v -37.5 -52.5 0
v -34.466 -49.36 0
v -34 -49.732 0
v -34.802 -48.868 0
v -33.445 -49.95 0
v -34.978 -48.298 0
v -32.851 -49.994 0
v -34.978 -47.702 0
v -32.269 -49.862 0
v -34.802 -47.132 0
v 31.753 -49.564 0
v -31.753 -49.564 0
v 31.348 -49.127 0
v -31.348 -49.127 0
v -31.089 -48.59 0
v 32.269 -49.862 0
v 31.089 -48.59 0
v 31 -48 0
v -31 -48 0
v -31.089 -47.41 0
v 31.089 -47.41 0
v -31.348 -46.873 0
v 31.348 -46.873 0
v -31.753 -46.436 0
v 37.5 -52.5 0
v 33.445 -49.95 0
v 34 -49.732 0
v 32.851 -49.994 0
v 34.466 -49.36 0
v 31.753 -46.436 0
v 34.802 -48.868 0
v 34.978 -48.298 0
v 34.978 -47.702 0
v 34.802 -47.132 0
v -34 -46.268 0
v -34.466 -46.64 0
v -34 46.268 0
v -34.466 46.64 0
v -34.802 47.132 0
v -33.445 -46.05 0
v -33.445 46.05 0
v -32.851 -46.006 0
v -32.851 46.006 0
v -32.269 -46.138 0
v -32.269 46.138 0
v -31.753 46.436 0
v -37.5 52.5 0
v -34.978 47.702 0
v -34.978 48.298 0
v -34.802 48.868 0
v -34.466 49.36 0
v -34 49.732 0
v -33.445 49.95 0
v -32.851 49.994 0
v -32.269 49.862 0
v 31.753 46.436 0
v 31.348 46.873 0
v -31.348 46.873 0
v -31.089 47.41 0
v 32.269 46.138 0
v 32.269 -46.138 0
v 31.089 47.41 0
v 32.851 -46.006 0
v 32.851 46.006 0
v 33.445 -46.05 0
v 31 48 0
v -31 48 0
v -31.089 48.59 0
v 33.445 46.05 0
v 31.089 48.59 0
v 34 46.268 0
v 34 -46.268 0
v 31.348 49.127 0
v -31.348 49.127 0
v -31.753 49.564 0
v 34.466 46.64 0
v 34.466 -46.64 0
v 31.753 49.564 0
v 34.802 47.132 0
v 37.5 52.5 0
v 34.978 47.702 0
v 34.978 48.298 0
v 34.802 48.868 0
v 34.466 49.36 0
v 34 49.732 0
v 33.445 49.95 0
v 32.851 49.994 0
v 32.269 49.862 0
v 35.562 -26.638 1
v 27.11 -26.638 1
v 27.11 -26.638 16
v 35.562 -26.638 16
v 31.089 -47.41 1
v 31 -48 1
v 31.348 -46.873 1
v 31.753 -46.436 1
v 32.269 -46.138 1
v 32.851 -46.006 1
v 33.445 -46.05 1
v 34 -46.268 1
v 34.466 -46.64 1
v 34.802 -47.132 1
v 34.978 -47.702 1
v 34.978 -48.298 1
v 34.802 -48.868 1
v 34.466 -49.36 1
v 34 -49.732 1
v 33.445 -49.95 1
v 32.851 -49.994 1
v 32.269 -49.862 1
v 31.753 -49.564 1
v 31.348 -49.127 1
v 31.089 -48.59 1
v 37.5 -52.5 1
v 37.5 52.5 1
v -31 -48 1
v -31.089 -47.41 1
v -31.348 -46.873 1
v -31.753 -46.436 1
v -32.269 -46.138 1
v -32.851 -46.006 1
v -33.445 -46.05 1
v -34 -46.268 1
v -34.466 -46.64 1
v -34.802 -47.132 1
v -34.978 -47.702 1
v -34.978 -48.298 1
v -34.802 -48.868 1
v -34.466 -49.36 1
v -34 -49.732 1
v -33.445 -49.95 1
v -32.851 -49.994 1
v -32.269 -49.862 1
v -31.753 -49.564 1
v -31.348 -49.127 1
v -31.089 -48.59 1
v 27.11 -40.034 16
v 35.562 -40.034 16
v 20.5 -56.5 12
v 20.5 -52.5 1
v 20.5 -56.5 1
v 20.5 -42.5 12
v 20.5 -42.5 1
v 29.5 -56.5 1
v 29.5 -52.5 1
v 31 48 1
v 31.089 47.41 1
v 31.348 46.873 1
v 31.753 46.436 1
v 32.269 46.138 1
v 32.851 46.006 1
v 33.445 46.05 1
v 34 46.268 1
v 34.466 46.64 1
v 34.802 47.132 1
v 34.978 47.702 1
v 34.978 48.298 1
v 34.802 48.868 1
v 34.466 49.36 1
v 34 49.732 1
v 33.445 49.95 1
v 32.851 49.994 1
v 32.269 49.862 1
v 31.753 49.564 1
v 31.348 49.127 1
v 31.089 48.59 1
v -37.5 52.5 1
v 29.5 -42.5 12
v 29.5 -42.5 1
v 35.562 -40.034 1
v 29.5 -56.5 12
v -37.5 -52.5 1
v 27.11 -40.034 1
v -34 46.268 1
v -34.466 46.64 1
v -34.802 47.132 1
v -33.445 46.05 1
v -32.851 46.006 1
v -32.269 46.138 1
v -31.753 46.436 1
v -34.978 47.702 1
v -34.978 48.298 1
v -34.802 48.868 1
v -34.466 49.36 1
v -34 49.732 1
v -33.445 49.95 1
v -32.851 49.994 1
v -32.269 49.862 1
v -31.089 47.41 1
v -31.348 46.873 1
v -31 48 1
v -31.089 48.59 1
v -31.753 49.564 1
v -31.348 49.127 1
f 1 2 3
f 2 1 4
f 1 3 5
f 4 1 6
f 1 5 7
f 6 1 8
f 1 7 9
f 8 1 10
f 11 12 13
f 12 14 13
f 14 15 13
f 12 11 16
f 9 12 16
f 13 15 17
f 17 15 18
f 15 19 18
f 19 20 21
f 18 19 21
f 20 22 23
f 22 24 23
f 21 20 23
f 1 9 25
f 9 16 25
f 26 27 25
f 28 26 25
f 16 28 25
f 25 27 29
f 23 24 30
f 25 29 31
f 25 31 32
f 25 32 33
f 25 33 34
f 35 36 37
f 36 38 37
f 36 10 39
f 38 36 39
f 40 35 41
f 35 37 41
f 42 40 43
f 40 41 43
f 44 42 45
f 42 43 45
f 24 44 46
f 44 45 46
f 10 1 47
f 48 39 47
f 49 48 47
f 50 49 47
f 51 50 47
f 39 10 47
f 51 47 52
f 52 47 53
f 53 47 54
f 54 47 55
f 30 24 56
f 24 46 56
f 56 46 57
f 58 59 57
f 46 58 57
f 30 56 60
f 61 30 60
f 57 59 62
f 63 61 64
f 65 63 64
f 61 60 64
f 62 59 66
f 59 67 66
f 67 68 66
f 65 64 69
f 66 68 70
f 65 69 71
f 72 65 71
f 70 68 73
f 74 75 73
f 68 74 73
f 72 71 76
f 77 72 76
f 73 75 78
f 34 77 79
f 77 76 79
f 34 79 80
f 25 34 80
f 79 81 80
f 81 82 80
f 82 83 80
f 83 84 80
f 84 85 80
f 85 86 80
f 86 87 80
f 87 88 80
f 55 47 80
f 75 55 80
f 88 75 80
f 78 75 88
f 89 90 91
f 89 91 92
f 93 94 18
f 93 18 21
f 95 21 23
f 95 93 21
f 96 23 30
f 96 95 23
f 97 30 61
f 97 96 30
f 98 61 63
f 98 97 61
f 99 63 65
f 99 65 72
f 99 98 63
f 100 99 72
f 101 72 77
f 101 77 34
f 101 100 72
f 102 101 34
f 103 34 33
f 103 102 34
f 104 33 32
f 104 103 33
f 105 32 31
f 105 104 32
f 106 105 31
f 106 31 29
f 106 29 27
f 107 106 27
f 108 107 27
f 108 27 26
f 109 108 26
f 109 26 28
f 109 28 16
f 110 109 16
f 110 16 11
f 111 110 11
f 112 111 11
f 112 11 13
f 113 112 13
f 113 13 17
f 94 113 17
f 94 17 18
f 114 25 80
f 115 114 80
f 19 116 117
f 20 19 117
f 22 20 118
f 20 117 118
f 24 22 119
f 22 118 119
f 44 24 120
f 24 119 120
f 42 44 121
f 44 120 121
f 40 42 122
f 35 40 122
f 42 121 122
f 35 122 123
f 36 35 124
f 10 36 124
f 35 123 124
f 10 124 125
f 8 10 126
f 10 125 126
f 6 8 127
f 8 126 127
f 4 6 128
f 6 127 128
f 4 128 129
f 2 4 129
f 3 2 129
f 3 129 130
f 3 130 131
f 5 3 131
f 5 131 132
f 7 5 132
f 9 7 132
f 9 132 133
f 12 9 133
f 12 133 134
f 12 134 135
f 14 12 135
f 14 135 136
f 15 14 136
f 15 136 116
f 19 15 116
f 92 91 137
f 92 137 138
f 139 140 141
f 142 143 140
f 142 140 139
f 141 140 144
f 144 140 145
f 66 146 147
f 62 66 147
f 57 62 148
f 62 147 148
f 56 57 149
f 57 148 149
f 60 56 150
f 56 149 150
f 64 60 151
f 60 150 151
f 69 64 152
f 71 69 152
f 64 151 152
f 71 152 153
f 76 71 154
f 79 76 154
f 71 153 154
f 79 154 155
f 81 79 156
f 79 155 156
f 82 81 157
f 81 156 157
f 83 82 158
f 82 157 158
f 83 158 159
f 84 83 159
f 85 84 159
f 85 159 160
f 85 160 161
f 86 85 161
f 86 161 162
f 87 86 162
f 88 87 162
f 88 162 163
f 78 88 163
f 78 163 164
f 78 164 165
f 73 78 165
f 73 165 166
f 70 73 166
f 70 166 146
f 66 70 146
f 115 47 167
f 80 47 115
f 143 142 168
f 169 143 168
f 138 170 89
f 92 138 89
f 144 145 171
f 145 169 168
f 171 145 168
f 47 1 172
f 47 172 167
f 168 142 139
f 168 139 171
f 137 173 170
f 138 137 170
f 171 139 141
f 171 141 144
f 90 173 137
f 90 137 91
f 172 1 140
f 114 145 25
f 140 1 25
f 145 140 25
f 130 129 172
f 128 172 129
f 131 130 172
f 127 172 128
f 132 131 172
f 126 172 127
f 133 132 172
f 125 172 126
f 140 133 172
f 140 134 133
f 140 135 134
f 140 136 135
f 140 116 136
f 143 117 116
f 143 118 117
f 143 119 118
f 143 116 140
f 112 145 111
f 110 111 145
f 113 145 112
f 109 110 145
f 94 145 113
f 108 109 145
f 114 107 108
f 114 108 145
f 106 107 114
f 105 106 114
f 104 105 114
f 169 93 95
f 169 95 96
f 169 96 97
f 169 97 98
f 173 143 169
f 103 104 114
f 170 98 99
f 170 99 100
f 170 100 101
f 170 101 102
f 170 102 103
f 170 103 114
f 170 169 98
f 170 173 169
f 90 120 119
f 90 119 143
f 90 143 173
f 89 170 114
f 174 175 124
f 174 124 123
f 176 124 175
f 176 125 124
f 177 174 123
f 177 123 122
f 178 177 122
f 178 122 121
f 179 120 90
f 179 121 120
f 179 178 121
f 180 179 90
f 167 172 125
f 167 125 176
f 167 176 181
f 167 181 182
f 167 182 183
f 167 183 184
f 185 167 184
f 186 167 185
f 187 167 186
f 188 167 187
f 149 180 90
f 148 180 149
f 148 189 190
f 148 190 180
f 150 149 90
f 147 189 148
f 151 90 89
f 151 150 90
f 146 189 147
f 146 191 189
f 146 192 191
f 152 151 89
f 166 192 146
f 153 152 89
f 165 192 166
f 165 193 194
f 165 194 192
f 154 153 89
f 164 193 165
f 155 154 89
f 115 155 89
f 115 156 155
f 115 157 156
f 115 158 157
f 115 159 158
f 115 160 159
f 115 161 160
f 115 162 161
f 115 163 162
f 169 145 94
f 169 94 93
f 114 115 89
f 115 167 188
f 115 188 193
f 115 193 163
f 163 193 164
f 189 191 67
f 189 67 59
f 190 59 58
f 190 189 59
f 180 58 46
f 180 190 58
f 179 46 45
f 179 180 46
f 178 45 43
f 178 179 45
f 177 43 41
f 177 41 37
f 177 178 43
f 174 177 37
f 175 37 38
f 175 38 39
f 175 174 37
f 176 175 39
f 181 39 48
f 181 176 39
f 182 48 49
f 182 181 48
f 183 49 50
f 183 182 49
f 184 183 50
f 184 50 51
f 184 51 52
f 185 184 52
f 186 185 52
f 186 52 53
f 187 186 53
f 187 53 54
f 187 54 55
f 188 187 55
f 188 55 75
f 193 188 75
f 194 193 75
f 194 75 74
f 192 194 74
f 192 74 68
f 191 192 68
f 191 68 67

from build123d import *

# Parameters (mm, degrees)
ESQUISSE1_W               = 75
ESQUISSE1_H               = 105
BOSS_EXTRU_1_DEPTH        = 1
ENL_V_MAT_EXTRU_1_REACH   = 66.525
ESQUISSE3_R               = 2
SYM_TRIE2_COPY_1_REACH    = 66.525
SYM_TRIE2_COPY_1_SKETCH_R = 2
ESQUISSE5_W               = 9
ESQUISSE5_H               = 11
BOSS_EXTRU_3_DEPTH        = 10
ESQUISSE5_2_W             = 9
ESQUISSE5_2_H             = 11
BOSS_EXTRU_4_DEPTH        = 4
ESQUISSE6_W               = 8.451892611
ESQUISSE6_H               = 13.39545244
BOSS_EXTRU_5_DEPTH        = 15


with BuildPart() as part:
    # Esquisse1 → Boss.-Extru.1 (new body)
    with BuildSketch(Plane.XY):
        Rectangle(ESQUISSE1_W, ESQUISSE1_H)
    extrude(amount=BOSS_EXTRU_1_DEPTH)

    # Esquisse3 → Enlèv. mat.-Extru.1 (cut, up to next)
    with BuildSketch(Plane.XY.offset(1), mode=Mode.PRIVATE) as enl_v_mat_extru_1_sk1:
        with Locations((-33, -48)):
            Circle(ESQUISSE3_R)
    enl_v_mat_extru_1_tool1 = extrude(enl_v_mat_extru_1_sk1.sketch, amount=-ENL_V_MAT_EXTRU_1_REACH, mode=Mode.PRIVATE) & part.part
    enl_v_mat_extru_1 = enl_v_mat_extru_1_tool1.solids().sort_by_distance((-33, -48, 1))[0]
    add(enl_v_mat_extru_1, mode=Mode.SUBTRACT)

    # Symétrie1: Enlèv. mat.-Extru.1 across plane
    add(enl_v_mat_extru_1.mirror(Plane(origin=(0, 0, 0), x_dir=(0, 0, 1), z_dir=(1, 0, 0))), mode=Mode.SUBTRACT)

    # Symétrie2: Enlèv. mat.-Extru.1 across plane
    add(enl_v_mat_extru_1.mirror(Plane.ZX), mode=Mode.SUBTRACT)

    # Symétrie2 copy 1 sketch → Symétrie2 copy 1 (cut, up to next)
    with BuildSketch(Plane(origin=(0, 0, 1), x_dir=(-1, 0, 0), z_dir=(0, 0, 1)), mode=Mode.PRIVATE) as sym_trie2_copy_1_sk1:
        with Locations((-33, -48)):
            Circle(SYM_TRIE2_COPY_1_SKETCH_R)
    sym_trie2_copy_1_tool1 = extrude(sym_trie2_copy_1_sk1.sketch, amount=-SYM_TRIE2_COPY_1_REACH, mode=Mode.PRIVATE) & part.part
    add(sym_trie2_copy_1_tool1.solids().sort_by_distance((33, 48, 1))[0], mode=Mode.SUBTRACT)

    # Esquisse5 → Boss.-Extru.3 (add)
    with BuildSketch(Plane.XZ.offset(52.5)):
        with Locations((25, 6.5)):
            Rectangle(ESQUISSE5_W, ESQUISSE5_H)
    extrude(amount=-BOSS_EXTRU_3_DEPTH)

    # Esquisse5<2> → Boss.-Extru.4 (add)
    with BuildSketch(Plane.XZ.offset(52.5)):
        with Locations((25, 6.5)):
            Rectangle(ESQUISSE5_2_W, ESQUISSE5_2_H)
    extrude(amount=BOSS_EXTRU_4_DEPTH)

    # Esquisse6 → Boss.-Extru.5 (add)
    with BuildSketch(Plane.XY.offset(1)):
        with Locations((31.335790529, -33.335790529)):
            Rectangle(ESQUISSE6_W, ESQUISSE6_H)
    extrude(amount=BOSS_EXTRU_5_DEPTH)


solid = part.part
